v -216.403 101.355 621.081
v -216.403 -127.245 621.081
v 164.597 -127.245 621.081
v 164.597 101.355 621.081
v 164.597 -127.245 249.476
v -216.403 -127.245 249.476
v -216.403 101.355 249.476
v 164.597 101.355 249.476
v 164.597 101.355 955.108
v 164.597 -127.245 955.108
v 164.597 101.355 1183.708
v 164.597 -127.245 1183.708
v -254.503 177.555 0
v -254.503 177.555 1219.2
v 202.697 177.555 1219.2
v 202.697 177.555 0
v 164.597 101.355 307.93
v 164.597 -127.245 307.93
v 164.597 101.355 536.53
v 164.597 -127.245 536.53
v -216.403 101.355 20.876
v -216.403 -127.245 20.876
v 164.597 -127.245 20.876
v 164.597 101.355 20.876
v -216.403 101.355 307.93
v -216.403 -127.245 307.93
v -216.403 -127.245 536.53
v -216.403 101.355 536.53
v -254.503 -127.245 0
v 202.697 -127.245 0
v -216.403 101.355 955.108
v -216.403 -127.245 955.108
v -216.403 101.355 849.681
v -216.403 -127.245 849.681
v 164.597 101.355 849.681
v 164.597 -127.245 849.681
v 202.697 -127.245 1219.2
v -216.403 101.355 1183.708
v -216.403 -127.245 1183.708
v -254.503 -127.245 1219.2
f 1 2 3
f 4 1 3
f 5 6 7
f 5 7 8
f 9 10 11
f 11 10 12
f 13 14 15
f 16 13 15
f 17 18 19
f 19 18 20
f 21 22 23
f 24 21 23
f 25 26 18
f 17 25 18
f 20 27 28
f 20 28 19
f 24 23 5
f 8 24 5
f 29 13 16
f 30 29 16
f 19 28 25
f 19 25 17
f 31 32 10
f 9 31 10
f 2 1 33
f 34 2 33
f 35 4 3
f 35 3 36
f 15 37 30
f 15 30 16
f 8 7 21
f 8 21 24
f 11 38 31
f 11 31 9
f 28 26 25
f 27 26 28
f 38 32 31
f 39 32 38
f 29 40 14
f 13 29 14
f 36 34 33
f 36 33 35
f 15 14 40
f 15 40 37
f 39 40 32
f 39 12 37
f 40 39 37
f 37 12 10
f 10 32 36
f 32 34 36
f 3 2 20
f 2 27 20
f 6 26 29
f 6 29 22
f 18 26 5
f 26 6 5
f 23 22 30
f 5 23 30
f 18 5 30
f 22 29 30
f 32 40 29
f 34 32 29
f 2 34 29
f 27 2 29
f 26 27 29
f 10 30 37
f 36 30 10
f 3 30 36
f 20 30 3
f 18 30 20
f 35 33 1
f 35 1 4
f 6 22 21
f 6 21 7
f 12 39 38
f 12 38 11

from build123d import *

# Parameters (mm, degrees)
F0_W     = 457.2
F0_H     = 304.8
F1_DEPTH = 1219.2
F2_W     = 381
F2_H     = 228.6
F3_DEPTH = 228.6


with BuildPart() as f1:
    # F0 (on Top) → F1 (new body)
    with BuildSketch(Plane.XY):
        with Locations((-25.902518, 25.154568)):
            Rectangle(F0_W, F0_H)
    extrude(amount=F1_DEPTH)

    # F2 (on face) → F3 (cut)
    with BuildSketch(Plane.XZ.offset(127.245432)):
        with Locations((-25.902518, 1069.40844)):
            Rectangle(F2_W, F2_H)
        with Locations((-25.902518, 735.381065)):
            Rectangle(F2_W, F2_H)
        with Locations((-25.902518, 422.230378)):
            Rectangle(F2_W, F2_H)
        with Locations((-25.902518, 135.175608)):
            Rectangle(F2_W, F2_H)
    extrude(amount=-F3_DEPTH, mode=Mode.SUBTRACT)


solid = f1.part
